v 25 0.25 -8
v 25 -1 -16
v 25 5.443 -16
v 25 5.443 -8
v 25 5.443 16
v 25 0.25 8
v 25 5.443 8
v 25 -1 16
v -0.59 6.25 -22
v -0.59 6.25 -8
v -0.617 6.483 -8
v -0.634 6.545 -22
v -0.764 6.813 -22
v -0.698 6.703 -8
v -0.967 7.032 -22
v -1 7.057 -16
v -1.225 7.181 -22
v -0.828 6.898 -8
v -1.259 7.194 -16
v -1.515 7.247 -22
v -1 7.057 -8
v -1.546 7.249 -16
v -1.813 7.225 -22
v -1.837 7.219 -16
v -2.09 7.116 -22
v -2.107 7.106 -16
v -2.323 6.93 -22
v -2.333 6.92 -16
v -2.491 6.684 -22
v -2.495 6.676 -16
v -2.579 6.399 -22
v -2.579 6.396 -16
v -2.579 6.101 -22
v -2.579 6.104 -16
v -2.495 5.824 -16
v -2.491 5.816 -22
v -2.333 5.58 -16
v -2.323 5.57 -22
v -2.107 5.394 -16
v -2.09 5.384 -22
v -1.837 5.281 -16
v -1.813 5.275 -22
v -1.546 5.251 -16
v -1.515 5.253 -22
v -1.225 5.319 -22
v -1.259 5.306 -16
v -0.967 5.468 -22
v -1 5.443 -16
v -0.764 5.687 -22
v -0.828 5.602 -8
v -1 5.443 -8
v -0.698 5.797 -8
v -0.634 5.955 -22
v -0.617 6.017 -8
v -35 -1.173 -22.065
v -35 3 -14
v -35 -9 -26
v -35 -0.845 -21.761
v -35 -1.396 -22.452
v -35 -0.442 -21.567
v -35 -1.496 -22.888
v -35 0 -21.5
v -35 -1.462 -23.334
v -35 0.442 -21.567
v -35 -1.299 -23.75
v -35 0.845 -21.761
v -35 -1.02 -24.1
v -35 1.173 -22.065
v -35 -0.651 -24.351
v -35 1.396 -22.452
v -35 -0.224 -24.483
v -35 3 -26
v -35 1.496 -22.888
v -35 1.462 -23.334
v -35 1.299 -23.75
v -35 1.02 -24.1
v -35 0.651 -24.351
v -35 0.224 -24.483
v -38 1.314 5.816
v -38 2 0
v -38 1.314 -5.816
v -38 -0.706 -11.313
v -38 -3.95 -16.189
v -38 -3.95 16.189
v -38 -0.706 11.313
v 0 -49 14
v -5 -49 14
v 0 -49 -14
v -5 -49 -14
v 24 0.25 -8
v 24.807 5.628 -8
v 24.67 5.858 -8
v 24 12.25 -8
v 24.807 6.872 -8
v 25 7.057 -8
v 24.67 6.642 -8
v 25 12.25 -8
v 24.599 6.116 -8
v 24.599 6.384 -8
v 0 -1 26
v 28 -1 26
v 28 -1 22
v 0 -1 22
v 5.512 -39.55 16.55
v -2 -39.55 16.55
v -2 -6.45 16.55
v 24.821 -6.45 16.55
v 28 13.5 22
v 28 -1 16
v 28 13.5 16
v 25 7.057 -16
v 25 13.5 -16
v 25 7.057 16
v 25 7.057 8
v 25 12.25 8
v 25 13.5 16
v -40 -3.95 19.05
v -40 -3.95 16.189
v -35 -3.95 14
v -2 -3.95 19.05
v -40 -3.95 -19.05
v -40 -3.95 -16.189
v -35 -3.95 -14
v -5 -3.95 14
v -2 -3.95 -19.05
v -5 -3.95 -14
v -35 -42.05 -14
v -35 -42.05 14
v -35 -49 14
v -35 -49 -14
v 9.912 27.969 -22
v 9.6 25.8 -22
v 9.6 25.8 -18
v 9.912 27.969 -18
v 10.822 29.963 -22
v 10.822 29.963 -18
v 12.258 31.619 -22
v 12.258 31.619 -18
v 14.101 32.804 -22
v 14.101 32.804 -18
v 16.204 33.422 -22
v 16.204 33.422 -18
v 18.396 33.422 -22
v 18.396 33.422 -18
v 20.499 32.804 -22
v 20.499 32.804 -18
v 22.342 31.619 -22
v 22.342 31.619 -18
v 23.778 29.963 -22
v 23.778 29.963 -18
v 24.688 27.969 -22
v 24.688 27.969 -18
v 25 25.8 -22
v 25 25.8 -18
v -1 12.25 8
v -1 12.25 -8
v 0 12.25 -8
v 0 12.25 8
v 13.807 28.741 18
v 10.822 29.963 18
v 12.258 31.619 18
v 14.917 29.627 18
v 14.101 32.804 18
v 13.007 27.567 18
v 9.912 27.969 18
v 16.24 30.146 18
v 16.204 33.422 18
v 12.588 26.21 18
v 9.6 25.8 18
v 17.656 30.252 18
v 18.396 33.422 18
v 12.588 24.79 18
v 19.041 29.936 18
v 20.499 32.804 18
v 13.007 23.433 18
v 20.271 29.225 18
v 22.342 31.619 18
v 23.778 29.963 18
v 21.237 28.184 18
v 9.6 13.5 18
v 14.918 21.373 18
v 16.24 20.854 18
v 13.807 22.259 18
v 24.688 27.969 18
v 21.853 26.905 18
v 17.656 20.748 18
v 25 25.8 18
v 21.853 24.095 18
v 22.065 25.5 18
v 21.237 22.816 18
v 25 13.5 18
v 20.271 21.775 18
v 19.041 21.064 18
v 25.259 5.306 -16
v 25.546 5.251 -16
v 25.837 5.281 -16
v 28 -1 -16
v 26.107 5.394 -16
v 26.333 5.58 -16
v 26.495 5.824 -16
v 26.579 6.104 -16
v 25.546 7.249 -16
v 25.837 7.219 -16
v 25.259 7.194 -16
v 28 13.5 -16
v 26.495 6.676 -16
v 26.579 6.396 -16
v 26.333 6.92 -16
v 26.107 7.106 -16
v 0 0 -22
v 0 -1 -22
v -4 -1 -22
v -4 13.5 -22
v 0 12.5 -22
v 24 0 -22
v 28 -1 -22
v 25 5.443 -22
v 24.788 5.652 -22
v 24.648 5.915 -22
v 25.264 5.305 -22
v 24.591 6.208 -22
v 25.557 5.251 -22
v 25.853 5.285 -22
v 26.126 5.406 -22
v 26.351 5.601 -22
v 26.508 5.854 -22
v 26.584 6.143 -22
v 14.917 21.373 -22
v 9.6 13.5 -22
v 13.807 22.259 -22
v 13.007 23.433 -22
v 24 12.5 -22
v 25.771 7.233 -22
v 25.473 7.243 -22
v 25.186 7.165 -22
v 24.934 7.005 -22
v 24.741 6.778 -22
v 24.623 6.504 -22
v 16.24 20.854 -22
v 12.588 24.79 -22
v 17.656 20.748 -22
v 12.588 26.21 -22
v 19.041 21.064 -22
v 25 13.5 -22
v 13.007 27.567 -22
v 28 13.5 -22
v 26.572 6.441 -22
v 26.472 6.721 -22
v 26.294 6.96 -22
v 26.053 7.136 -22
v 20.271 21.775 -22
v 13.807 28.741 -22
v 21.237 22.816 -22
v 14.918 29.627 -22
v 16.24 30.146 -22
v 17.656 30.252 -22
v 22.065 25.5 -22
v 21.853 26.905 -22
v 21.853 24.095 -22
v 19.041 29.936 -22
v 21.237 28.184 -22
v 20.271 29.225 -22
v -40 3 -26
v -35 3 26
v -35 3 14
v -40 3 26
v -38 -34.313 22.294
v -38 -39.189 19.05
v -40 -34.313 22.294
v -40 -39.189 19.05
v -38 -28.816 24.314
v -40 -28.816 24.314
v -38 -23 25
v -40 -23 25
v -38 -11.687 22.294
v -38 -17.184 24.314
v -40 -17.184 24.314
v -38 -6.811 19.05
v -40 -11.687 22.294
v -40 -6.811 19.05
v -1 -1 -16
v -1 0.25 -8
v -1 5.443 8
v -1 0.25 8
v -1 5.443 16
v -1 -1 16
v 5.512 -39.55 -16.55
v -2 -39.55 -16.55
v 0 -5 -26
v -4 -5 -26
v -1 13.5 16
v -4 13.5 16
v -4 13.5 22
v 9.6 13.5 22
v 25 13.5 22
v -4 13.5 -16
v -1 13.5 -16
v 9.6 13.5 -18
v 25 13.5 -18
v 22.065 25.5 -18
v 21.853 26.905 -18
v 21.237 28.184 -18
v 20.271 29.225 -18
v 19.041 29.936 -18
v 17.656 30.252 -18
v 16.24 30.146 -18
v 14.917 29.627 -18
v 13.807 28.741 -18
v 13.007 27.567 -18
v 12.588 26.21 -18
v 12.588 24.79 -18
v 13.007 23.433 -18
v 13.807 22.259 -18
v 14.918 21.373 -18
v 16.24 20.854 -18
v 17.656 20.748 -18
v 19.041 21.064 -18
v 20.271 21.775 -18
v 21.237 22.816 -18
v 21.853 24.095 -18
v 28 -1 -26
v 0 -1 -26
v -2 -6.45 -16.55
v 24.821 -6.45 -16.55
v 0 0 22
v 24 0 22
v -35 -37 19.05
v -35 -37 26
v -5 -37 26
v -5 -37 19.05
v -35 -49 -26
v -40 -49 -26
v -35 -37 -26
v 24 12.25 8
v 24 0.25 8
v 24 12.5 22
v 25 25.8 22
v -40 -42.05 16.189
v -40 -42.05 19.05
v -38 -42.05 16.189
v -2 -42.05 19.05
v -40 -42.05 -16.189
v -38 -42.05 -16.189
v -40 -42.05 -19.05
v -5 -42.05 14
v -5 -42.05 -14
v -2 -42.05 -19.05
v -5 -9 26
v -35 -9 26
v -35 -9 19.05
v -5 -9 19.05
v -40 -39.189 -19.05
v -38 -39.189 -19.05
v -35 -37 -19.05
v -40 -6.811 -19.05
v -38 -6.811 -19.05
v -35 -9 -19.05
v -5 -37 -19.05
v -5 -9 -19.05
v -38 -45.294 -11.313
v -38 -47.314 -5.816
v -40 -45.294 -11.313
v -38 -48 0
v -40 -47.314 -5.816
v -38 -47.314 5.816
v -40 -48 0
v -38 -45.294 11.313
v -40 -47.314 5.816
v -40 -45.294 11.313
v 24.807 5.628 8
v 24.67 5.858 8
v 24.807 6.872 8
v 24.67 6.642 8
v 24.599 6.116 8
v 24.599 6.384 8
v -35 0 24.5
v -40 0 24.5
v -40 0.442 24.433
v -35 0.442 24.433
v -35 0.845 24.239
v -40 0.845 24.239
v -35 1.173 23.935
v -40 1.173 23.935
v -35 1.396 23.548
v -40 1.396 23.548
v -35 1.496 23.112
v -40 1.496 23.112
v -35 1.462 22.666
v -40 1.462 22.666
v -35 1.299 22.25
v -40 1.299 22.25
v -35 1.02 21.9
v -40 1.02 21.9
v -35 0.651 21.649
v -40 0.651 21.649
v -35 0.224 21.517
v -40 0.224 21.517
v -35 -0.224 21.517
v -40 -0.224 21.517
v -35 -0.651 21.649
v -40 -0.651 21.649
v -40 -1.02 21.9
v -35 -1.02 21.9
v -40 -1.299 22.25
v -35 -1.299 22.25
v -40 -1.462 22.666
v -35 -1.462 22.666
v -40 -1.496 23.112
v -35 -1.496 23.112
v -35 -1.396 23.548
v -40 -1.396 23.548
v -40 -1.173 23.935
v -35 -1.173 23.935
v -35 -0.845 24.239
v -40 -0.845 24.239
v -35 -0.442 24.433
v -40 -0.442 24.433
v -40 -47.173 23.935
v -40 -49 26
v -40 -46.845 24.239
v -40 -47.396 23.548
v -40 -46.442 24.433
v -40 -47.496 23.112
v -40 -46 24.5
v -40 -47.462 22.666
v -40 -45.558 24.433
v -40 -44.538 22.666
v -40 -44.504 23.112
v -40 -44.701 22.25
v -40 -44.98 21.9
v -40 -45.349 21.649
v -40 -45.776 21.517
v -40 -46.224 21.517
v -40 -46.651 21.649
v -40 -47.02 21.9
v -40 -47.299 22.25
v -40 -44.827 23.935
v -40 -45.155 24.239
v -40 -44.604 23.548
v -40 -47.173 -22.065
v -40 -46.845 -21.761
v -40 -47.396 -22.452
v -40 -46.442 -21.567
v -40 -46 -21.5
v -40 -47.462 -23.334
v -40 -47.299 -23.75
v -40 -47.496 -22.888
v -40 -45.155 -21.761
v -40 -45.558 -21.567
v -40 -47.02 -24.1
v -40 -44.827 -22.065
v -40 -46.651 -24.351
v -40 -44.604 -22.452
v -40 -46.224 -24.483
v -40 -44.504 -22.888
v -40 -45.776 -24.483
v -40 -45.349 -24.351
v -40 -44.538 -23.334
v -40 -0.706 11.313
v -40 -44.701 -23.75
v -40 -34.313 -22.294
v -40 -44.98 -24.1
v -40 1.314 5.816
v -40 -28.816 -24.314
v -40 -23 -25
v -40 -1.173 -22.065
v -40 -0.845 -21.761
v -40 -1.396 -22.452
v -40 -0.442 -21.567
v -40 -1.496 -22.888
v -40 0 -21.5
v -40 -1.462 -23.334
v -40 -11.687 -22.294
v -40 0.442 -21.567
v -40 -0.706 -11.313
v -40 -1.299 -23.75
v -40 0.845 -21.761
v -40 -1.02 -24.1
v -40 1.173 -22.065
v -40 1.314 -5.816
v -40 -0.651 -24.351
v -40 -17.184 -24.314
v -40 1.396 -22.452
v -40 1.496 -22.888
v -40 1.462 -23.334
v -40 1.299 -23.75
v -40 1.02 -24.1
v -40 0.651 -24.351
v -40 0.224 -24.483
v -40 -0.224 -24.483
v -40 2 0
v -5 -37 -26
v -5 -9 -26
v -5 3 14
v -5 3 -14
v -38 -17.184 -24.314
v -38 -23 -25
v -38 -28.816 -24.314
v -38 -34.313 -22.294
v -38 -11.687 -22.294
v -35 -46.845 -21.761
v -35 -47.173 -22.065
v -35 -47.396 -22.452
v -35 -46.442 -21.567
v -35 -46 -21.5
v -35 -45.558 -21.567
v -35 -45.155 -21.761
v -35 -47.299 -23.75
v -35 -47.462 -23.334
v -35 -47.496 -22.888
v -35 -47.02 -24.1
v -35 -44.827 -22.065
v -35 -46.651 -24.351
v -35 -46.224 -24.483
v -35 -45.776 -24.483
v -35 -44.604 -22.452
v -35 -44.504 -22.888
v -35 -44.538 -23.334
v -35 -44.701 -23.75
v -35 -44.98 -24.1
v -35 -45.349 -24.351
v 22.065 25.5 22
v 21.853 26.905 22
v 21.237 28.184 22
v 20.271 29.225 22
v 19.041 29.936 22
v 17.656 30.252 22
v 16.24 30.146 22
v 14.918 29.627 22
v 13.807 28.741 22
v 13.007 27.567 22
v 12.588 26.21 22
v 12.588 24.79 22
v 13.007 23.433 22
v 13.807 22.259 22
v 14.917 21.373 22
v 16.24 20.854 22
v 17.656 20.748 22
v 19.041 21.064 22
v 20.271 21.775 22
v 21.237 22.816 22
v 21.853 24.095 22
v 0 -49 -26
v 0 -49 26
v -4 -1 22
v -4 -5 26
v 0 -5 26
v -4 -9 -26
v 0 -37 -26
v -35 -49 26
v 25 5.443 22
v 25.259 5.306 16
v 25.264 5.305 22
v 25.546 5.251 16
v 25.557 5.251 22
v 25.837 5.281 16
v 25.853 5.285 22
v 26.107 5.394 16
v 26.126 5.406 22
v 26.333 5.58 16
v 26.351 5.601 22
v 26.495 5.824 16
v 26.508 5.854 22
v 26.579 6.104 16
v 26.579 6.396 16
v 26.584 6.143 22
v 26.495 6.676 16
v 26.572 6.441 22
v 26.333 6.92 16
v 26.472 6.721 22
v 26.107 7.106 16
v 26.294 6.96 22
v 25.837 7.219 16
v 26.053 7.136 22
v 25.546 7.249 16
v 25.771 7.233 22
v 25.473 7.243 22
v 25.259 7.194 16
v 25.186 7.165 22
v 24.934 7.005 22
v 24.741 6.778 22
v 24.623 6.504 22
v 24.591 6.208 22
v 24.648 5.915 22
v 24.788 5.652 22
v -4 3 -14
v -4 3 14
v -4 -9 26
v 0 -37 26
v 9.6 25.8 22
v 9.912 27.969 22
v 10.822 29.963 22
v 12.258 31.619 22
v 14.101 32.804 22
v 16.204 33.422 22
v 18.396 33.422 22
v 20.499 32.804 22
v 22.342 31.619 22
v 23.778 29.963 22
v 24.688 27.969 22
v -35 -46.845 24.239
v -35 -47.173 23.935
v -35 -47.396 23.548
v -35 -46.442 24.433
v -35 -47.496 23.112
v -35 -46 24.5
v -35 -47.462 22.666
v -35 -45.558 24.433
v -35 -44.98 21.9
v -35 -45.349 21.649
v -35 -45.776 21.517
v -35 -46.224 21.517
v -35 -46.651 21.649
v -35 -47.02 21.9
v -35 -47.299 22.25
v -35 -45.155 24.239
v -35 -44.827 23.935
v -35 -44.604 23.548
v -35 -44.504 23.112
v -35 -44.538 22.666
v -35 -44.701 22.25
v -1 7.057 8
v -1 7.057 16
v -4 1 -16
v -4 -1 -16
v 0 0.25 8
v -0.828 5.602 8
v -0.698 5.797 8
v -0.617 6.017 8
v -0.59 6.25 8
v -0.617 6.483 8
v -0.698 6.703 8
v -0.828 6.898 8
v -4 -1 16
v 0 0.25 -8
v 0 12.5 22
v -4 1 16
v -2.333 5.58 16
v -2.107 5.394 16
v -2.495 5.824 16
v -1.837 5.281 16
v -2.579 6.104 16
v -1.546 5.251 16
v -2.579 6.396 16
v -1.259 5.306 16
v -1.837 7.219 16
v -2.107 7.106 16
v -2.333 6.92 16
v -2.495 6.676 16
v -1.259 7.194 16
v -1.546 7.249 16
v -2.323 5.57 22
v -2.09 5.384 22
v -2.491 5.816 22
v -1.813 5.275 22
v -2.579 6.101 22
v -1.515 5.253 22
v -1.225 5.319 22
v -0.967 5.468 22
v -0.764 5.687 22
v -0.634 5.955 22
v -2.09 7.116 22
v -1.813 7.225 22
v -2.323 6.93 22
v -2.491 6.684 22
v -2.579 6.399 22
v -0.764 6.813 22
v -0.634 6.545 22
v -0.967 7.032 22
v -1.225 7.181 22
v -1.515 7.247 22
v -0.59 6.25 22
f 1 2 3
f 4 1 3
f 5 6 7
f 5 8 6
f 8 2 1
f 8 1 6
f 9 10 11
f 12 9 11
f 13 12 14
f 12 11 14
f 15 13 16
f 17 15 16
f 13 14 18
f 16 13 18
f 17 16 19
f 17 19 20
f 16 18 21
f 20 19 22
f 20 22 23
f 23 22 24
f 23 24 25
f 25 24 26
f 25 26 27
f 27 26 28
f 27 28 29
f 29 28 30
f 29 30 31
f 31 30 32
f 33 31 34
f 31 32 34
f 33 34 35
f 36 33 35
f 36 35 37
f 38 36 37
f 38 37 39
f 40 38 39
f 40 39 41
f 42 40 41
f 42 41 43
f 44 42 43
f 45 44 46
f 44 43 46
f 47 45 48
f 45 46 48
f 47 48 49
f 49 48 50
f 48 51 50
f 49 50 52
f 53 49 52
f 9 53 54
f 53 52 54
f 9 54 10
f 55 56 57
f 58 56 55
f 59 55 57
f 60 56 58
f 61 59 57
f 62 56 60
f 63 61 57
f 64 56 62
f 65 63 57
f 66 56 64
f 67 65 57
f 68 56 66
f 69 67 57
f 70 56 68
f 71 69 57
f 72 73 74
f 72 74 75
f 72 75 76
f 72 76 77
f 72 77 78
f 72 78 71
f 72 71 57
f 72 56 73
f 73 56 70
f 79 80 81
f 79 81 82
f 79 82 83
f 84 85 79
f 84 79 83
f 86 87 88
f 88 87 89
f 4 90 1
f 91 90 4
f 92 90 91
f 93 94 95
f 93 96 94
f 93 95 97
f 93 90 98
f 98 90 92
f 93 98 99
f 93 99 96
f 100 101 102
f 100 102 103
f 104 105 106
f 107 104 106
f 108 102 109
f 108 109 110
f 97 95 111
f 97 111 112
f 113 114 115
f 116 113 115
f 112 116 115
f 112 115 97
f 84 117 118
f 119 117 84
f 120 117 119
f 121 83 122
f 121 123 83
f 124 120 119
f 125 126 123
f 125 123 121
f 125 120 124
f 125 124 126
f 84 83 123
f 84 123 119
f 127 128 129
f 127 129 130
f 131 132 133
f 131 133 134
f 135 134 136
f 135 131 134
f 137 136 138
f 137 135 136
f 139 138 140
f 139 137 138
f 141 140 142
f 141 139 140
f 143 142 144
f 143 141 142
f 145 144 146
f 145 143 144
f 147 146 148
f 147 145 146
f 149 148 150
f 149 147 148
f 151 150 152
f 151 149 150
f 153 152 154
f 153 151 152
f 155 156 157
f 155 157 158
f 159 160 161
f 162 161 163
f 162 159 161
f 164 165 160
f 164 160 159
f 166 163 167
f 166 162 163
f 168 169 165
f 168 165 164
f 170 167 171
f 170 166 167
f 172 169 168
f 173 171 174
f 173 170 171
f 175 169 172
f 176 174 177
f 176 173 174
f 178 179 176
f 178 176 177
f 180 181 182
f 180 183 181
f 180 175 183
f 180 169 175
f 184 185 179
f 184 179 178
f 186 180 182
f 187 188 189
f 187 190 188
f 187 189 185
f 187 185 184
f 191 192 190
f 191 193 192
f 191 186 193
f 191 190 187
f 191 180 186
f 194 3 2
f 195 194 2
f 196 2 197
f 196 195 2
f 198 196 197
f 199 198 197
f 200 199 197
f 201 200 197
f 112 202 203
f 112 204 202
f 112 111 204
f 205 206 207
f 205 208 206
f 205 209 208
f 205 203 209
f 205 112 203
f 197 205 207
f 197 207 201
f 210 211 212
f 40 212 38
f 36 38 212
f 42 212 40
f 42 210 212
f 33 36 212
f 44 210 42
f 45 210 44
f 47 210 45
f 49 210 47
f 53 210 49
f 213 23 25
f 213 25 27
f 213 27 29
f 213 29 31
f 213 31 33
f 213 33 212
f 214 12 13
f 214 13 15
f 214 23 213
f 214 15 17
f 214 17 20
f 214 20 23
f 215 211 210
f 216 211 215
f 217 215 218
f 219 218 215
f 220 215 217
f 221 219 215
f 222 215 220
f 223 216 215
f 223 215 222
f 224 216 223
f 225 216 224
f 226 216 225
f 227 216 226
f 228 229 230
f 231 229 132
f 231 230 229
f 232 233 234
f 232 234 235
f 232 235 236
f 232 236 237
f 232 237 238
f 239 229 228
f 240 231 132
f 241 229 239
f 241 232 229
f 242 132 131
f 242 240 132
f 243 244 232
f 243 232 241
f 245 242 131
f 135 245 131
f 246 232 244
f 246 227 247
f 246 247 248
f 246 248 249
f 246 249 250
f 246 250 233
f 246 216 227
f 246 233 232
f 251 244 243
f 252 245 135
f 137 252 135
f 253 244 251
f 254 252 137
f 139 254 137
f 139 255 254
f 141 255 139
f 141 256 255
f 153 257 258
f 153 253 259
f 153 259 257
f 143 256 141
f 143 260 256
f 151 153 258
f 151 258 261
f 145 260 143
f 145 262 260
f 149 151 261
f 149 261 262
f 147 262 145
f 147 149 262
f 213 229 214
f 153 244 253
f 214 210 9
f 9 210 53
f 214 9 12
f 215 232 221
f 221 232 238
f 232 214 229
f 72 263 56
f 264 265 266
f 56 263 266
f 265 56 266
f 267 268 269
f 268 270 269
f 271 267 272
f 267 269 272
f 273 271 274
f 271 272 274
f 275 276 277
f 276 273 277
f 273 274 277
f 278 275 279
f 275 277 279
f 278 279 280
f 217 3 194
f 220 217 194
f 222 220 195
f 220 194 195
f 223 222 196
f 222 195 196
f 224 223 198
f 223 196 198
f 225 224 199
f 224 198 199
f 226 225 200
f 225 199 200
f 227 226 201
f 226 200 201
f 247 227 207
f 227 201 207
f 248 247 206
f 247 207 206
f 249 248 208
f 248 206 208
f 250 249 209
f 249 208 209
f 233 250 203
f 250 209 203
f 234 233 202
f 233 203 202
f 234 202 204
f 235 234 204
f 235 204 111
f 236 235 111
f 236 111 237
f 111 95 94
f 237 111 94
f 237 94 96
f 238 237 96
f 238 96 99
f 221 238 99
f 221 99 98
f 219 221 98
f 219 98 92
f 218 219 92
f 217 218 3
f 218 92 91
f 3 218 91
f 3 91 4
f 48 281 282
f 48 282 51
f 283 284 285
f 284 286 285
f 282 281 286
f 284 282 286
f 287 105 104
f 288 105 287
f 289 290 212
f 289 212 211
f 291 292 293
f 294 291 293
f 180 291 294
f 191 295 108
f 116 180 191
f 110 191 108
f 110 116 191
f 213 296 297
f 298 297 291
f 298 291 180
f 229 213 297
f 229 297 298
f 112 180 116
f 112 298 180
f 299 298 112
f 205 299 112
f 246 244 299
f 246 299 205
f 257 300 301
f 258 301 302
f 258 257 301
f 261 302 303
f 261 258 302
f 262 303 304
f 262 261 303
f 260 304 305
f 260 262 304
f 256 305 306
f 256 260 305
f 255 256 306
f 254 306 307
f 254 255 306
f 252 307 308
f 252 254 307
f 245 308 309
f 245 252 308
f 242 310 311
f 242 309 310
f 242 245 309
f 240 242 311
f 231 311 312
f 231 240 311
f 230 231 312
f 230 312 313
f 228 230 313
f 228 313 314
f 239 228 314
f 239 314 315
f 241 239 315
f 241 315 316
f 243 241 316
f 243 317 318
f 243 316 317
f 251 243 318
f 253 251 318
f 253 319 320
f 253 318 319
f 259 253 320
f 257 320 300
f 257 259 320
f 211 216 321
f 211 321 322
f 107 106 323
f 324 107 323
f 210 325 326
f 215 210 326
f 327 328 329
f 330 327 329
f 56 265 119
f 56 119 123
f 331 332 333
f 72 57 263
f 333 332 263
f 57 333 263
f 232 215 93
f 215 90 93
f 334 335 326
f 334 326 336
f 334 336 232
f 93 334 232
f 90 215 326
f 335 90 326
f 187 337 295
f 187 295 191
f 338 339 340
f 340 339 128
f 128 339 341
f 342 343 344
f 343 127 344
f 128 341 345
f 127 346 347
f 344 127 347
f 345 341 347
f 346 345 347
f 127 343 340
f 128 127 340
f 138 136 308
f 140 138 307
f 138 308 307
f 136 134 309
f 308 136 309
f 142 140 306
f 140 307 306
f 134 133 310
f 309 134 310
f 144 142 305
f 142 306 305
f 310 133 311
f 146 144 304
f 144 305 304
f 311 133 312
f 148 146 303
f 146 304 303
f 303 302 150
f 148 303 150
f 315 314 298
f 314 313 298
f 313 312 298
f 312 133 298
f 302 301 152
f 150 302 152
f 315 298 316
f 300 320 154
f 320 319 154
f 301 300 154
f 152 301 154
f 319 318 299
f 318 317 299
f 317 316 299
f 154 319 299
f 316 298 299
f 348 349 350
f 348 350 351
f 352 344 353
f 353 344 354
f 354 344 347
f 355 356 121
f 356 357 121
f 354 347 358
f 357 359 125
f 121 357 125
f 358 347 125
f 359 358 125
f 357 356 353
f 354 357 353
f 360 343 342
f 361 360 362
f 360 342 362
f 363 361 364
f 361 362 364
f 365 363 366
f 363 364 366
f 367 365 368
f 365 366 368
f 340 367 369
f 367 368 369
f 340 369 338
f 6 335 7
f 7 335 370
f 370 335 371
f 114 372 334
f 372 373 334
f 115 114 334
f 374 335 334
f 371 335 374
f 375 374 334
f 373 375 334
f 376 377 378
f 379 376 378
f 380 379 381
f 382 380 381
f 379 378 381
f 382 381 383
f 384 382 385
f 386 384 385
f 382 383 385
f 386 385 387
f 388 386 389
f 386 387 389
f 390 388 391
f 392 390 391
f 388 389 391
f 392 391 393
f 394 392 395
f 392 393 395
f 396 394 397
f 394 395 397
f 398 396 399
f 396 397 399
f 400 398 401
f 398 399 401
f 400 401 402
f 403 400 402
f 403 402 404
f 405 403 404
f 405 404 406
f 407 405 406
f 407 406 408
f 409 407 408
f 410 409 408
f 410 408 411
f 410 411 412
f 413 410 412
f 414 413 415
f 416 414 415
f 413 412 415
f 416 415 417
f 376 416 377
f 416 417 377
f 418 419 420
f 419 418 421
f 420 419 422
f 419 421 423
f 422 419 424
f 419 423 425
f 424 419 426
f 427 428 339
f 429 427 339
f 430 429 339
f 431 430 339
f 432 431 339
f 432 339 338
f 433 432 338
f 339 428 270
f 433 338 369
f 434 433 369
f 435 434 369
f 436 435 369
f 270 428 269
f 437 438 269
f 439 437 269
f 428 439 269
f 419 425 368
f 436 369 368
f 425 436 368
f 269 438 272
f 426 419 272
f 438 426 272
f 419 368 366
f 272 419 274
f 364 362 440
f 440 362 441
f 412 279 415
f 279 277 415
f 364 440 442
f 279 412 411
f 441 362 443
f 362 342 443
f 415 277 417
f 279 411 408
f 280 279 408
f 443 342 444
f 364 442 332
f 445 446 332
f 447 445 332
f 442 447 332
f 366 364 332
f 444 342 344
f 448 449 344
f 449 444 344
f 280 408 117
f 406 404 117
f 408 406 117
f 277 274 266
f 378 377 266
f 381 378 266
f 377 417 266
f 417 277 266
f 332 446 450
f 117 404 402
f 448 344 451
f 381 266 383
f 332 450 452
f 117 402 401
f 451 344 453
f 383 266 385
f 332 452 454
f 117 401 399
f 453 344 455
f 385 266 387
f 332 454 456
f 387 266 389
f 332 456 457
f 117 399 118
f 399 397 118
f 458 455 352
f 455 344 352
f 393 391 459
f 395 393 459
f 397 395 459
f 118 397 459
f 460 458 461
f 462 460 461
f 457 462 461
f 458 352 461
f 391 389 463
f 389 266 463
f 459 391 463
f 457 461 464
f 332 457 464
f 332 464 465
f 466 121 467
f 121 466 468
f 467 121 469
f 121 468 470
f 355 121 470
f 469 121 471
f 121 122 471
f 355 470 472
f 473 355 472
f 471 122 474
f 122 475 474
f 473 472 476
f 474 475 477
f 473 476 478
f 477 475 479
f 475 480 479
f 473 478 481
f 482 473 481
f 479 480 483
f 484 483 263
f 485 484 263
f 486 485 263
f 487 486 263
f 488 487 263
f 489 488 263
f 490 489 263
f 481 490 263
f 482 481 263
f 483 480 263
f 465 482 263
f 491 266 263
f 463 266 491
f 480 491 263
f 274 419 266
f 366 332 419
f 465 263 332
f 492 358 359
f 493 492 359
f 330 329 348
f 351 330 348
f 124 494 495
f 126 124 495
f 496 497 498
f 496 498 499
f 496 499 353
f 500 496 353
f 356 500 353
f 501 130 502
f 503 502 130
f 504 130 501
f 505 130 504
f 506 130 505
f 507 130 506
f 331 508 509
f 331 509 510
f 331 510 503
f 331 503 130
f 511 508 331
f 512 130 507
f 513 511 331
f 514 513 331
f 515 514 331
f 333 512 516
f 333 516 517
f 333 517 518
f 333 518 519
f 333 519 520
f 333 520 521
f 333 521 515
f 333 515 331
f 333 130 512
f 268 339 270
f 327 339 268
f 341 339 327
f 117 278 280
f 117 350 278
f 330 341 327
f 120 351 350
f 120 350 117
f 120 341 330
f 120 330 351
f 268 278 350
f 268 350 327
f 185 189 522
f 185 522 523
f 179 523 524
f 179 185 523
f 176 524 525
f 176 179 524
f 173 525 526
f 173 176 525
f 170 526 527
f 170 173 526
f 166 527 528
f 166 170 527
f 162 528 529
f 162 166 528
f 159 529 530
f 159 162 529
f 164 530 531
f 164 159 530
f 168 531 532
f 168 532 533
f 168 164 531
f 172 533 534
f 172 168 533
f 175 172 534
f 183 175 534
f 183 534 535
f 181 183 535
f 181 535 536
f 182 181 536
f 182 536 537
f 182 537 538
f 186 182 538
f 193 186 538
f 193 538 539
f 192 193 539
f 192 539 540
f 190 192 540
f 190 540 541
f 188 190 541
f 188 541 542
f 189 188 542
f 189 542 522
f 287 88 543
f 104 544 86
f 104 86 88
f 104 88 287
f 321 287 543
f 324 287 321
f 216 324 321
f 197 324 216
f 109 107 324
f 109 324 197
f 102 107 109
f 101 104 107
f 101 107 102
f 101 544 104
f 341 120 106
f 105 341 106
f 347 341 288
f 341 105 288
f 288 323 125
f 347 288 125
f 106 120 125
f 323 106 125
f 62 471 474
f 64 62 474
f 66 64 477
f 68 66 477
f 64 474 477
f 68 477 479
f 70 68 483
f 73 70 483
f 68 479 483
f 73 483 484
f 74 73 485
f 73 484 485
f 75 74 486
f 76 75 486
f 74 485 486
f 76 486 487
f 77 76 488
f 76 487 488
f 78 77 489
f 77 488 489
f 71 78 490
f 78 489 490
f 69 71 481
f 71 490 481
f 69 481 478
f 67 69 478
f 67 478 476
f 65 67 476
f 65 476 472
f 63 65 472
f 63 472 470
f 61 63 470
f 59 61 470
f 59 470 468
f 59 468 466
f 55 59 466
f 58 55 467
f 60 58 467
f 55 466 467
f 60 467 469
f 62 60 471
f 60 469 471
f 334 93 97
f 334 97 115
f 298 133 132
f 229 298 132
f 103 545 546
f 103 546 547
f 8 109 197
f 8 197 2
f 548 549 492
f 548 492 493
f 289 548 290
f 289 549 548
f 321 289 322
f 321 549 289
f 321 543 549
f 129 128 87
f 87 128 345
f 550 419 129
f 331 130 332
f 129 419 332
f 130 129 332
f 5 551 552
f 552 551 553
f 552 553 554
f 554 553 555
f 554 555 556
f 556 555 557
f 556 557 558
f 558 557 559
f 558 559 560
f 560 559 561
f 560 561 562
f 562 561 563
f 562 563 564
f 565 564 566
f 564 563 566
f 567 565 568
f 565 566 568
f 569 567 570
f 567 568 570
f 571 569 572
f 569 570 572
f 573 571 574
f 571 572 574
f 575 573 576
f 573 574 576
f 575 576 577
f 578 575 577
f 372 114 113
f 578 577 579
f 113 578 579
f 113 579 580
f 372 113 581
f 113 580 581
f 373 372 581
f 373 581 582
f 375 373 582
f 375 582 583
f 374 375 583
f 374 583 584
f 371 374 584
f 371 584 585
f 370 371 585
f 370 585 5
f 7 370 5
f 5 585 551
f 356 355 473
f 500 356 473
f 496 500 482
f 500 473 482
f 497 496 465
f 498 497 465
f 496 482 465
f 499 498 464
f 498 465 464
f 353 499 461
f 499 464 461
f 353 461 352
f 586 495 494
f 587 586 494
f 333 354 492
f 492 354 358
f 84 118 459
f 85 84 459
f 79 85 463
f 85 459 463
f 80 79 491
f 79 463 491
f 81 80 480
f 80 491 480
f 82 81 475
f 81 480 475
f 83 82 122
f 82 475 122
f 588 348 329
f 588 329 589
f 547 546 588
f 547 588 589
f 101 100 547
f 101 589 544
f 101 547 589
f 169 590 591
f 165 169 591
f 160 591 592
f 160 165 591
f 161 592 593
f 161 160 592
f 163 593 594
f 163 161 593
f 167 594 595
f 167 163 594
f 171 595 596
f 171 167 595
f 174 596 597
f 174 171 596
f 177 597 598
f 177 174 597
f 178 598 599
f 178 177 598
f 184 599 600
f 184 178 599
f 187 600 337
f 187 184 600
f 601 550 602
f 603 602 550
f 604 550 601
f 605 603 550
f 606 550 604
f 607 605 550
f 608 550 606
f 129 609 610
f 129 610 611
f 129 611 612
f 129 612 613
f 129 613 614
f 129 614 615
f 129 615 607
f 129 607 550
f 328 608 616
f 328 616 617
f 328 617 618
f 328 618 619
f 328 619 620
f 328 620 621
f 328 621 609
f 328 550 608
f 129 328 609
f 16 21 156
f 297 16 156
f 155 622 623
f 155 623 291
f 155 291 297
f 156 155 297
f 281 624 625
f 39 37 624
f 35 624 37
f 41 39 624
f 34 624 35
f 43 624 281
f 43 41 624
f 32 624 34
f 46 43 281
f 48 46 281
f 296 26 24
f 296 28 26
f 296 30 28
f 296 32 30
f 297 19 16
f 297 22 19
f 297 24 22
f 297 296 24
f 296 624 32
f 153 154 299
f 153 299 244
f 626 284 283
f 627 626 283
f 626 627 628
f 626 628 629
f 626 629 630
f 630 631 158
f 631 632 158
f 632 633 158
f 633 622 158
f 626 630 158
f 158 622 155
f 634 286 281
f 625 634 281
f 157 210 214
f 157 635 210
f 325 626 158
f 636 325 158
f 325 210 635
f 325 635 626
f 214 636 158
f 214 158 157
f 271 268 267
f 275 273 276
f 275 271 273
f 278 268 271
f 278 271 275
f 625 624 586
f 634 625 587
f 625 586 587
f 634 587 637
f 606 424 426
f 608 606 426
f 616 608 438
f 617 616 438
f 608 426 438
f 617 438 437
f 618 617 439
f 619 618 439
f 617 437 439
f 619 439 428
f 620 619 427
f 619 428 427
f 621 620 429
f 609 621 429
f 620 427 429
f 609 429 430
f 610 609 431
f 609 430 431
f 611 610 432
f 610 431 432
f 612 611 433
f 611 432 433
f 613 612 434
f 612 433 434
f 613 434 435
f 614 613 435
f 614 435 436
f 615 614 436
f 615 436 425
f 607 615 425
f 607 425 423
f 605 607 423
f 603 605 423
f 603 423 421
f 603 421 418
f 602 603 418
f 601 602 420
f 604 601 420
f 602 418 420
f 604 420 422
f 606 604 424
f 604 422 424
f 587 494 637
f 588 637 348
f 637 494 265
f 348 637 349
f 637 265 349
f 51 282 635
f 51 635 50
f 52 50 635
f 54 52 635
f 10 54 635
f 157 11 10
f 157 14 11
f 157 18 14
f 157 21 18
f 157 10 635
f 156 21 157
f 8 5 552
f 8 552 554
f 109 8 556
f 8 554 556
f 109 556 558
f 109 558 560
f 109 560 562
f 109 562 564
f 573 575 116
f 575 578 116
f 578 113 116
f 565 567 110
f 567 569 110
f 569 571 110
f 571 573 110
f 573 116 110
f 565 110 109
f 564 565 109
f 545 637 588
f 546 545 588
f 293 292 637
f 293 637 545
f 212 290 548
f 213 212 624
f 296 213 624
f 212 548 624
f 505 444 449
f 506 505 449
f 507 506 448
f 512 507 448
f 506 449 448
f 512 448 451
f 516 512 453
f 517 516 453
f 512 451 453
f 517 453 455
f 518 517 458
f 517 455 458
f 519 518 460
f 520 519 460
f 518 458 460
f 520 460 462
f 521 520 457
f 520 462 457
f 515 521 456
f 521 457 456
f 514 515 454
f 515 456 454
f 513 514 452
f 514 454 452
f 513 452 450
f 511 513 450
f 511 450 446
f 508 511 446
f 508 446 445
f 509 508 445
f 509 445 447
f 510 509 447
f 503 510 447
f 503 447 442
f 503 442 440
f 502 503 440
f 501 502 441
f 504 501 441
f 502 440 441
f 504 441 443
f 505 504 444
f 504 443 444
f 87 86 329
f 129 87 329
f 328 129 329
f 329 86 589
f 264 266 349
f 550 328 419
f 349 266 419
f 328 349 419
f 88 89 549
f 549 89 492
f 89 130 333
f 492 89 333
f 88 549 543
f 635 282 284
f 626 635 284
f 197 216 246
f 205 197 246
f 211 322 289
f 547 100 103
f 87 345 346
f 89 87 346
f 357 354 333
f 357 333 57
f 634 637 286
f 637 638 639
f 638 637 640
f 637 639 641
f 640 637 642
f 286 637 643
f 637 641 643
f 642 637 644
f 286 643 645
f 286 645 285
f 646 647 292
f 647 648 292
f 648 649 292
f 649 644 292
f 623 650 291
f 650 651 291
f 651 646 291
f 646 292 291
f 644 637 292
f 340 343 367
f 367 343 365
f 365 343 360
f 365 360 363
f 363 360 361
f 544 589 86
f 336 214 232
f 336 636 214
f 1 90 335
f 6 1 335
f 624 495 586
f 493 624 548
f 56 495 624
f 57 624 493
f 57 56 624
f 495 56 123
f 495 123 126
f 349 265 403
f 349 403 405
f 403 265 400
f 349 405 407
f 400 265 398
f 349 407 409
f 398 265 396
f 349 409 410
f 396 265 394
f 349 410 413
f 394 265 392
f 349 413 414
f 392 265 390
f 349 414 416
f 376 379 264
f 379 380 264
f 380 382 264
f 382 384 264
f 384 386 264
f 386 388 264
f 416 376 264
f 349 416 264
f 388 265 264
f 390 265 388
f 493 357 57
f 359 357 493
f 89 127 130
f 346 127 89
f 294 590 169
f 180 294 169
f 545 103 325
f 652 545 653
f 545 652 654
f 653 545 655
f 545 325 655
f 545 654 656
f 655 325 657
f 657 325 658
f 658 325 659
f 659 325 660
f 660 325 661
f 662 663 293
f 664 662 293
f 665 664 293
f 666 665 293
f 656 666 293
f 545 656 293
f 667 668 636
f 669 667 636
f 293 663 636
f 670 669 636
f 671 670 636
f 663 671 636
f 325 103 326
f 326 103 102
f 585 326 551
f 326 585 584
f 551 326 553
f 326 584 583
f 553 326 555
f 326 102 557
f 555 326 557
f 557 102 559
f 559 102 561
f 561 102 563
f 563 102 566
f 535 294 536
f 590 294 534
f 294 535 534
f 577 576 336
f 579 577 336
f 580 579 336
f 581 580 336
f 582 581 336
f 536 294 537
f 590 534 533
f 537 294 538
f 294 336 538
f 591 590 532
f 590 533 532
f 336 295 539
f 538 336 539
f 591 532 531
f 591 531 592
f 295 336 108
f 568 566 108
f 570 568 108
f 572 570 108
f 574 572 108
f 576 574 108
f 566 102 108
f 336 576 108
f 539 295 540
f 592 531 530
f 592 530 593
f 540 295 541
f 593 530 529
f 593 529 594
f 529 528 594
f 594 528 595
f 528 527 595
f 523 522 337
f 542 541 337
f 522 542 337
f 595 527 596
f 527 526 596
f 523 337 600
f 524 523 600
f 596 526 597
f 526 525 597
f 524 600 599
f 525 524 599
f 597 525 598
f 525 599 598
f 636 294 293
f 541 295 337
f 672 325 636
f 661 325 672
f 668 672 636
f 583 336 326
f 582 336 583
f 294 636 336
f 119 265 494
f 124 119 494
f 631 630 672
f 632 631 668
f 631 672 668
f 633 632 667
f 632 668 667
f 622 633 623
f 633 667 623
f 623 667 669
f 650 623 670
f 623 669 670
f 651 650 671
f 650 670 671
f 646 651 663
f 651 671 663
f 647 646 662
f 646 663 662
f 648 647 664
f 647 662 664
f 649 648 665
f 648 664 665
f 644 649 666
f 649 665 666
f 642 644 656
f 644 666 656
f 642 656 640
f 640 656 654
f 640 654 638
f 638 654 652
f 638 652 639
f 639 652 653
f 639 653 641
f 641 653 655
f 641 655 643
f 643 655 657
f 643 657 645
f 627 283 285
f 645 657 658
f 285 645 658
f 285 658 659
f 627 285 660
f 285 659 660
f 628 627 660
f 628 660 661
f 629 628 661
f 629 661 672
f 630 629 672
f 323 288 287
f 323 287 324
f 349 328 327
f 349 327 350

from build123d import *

# Parameters (mm, degrees)
SKETCH1_W            = 26
SKETCH1_H            = 14.5
SKETCH1_W_2          = 24
SKETCH1_H_2          = 12.5
BOSS_EXTRUDE1_DEPTH  = 22
SKETCH2_W            = 3
SKETCH2_H            = 14.5
BOSS_EXTRUDE2_DEPTH  = 6
CUT_EXTRUDE1_REACH   = 40.823
SKETCH3_W            = 16
SKETCH3_H            = 12
CUT_EXTRUDE2_REACH   = 55.873
SKETCH4_R            = 1
SKETCH5_W            = 44
SKETCH5_H            = 44
SKETCH5_W_2          = 38.1
SKETCH5_H_2          = 38.1
BOSS_EXTRUDE3_DEPTH  = 40
SKETCH8_W            = 52
SKETCH8_H            = 52
SKETCH8_W_2          = 44
SKETCH8_H_2          = 44
BOSS_EXTRUDE5_DEPTH  = 36
SKETCH6_R            = 25
CUT_EXTRUDE5_DEPTH   = 2
BOSS_EXTRUDE6_DEPTH  = 4
CHAMFER1_SIZE        = 12
CUT_EXTRUDE7_REACH   = 83.884
SKETCH11_W           = 30
SKETCH11_H           = 28
CUT_EXTRUDE8_REACH   = 72.569
SKETCH12_W           = 30
SKETCH12_H           = 28
CHAMFER3_SIZE        = 4
SKETCH14_R           = 1.5
BOSS_EXTRUDE7_DEPTH  = 5
SKETCH15_W           = 38.1
SKETCH15_H           = 38.1
SKETCH15_W_2         = 33.1
SKETCH15_H_2         = 33.1
BOSS_EXTRUDE8_DEPTH  = 2
SKETCH16_W           = 15.4
SKETCH16_H           = 4
BOSS_EXTRUDE9_DEPTH  = 20
CUT_EXTRUDE10_START  = -44
SKETCH18_R           = 4.765
CUT_EXTRUDE10_DEPTH  = 44
FILLET4_RADIUS       = 7.7
FILLET4_LENGTH       = 4
FILLET5_RADIUS       = 7.7
FILLET5_LENGTH       = 4
BOSS_EXTRUDE10_REACH = 83.884
CUT_EXTRUDE12_REACH  = 70.389
SKETCH15_3_W         = 33.1
SKETCH15_3_H         = 33.1


# Some blends are built 0.0001 mm under size
with BuildPart() as part:
    # Sketch1 → Boss-Extrude1 (new body)
    with BuildSketch(Plane.XY):
        with Locations((12, 6.25)):
            Rectangle(SKETCH1_W, SKETCH1_H)
        with Locations((12, 6.25)):
            Rectangle(SKETCH1_W_2, SKETCH1_H_2, mode=Mode.SUBTRACT)
    boss_extrude1 = extrude(amount=BOSS_EXTRUDE1_DEPTH)

    # Sketch2 → Boss-Extrude2 (add)
    with BuildSketch(Plane.XY.offset(22)):
        with Locations((-2.5, 6.25)):
            Rectangle(SKETCH2_W, SKETCH2_H)
        with Locations((26.5, 6.25)):
            Rectangle(SKETCH2_W, SKETCH2_H)
    boss_extrude2 = extrude(amount=-BOSS_EXTRUDE2_DEPTH)

    # Mirror2: Boss-Extrude1, Boss-Extrude2 across plane
    add(boss_extrude1.mirror(Plane(origin=(0, 0, 0), x_dir=(1, 0, 0), z_dir=(0, 0, -1))))
    add(boss_extrude2.mirror(Plane(origin=(0, 0, 0), x_dir=(1, 0, 0), z_dir=(0, 0, -1))))

    # Cut-Extrude1: up to this face of the body (flat: up to its plane)
    cut_extrude1_end = Plane(part.part.faces().sort_by_distance((25, 6.25, 0))[0])
    # Sketch3 → Cut-Extrude1 (cut, up to the picked face)
    with BuildSketch(Plane.ZY.offset(1), mode=Mode.PRIVATE) as cut_extrude1_sk1:
        with Locations((0, 6.25)):
            Rectangle(SKETCH3_W, SKETCH3_H)
    cut_extrude1_tool1 = split(extrude(cut_extrude1_sk1.sketch, amount=-CUT_EXTRUDE1_REACH, mode=Mode.PRIVATE), bisect_by=cut_extrude1_end, keep=Keep.BOTH, mode=Mode.PRIVATE)
    add(cut_extrude1_tool1.solids().sort_by(Axis((-1, 6.25, 0), (1, 0, 0)))[0], mode=Mode.SUBTRACT)

    # Sketch4 → Cut-Extrude2 (cut, up to next)
    with BuildSketch(Plane.XY.offset(22), mode=Mode.PRIVATE) as cut_extrude2_sk1:
        with Locations((-1.59, 6.25)):
            Circle(SKETCH4_R)
    cut_extrude2_tool1 = extrude(cut_extrude2_sk1.sketch, amount=-CUT_EXTRUDE2_REACH, mode=Mode.PRIVATE) & part.part
    # Sketch4 → Cut-Extrude2 (cut, up to next)
    with BuildSketch(Plane.XY.offset(22), mode=Mode.PRIVATE) as cut_extrude2_sk2:
        with Locations(Location((25.59, 6.25, 0), (0, 0, 233.842991799))):
            Circle(SKETCH4_R)
    cut_extrude2_tool2 = extrude(cut_extrude2_sk2.sketch, amount=-CUT_EXTRUDE2_REACH, mode=Mode.PRIVATE) & part.part
    add(cut_extrude2_tool1.solids().sort_by_distance((-1.59, 6.25, 22))[0], mode=Mode.SUBTRACT)
    add(cut_extrude2_tool1.solids().sort_by_distance((-1.59, 6.25, 22))[1], mode=Mode.SUBTRACT)
    add(cut_extrude2_tool2.solids().sort_by_distance((25.59, 6.25, 22))[0], mode=Mode.SUBTRACT)
    add(cut_extrude2_tool2.solids().sort_by_distance((25.59, 6.25, 22))[1], mode=Mode.SUBTRACT)

    # Sketch5 → Boss-Extrude3 (add)
    with BuildSketch(Plane(origin=(0, 0, 0), x_dir=(0, 0, -1), z_dir=(1, 0, 0))):
        with Locations((0, -23)):
            Rectangle(SKETCH5_W, SKETCH5_H)
        with Locations((0, -23)):
            Rectangle(SKETCH5_W_2, SKETCH5_H_2, mode=Mode.SUBTRACT)
    extrude(amount=-BOSS_EXTRUDE3_DEPTH)

    # Sketch8 → Boss-Extrude5 (add)
    with BuildSketch(Plane.ZY.offset(40)):
        with Locations((0, -23)):
            Rectangle(SKETCH8_W, SKETCH8_H)
        with Locations((0, -23)):
            Rectangle(SKETCH8_W_2, SKETCH8_H_2, mode=Mode.SUBTRACT)
    extrude(amount=-BOSS_EXTRUDE5_DEPTH)

    # Sketch6 → Cut-Extrude5 (cut)
    with BuildSketch(Plane.ZY.offset(40)):
        with Locations((0, -23)):
            Circle(SKETCH6_R)
    extrude(amount=-CUT_EXTRUDE5_DEPTH, mode=Mode.SUBTRACT)

    # Sketch9 → Boss-Extrude6 (add)
    with BuildSketch(Plane(origin=(-4, 0, 0), x_dir=(0, 0, -1), z_dir=(1, 0, 0))):
        Polygon((-26, -49), (26, -49), (26, -1), (22, -1), (22, -45), (-22, -45), (-22, -1), (-26, -1), align=None)
    extrude(amount=BOSS_EXTRUDE6_DEPTH)

    # Chamfer1
    # the kernel refuses this chamfer: 12 mm, written as the material it takes off along each edge
    with BuildSketch(Plane(origin=(-70.860195856, 3, 26), x_dir=(0, 0.027495876610586382, -0.9996219169112968), z_dir=(1, 0, 0))) as chamfer1_piece_1:
        Polygon((CHAMFER1_SIZE * 0.999621916911, -CHAMFER1_SIZE * 0.0274958766106), (-CHAMFER1_SIZE * 0.0274958766106, -CHAMFER1_SIZE * 0.999621916911), (0, 0), align=None)
    extrude(amount=66.860195856, mode=Mode.SUBTRACT)
    with BuildSketch(Plane(origin=(30.860195856, -49, 26), x_dir=(0, -0.027495876610586202, -0.9996219169112968), z_dir=(-1, 0, 0)), Plane(origin=(-70.860195856, -49, -26), x_dir=(0, -0.027495876610586202, 0.9996219169112968), z_dir=(1, 0, 0))) as chamfer1_piece_2:
        Polygon((CHAMFER1_SIZE * 0.999621916911, -CHAMFER1_SIZE * 0.0274958766106), (-CHAMFER1_SIZE * 0.0274958766106, -CHAMFER1_SIZE * 0.999621916911), (0, 0), align=None)
    extrude(amount=101.720391711, mode=Mode.SUBTRACT)
    with BuildSketch(Plane(origin=(-70.860195856, 3, -26), x_dir=(0, 0.027495876610586382, 0.9996219169112968), z_dir=(1, 0, 0))) as chamfer1_piece_3:
        Polygon((CHAMFER1_SIZE * 0.999621916911, CHAMFER1_SIZE * 0.0274958766106), (-CHAMFER1_SIZE * 0.0274958766106, CHAMFER1_SIZE * 0.999621916911), (0, 0), align=None)
    extrude(amount=66.860195856, mode=Mode.SUBTRACT)

    # Cut-Extrude7: up to this face of the body (flat: up to its plane)
    cut_extrude7_end = Plane(part.part.faces().sort_by_distance((-19.5, -22.5, -26))[0])
    # Sketch11 → Cut-Extrude7 (cut, up to the picked face)
    with BuildSketch(Plane.XY.offset(26), mode=Mode.PRIVATE) as cut_extrude7_sk1:
        with Locations((-20, -23)):
            Rectangle(SKETCH11_W, SKETCH11_H)
    cut_extrude7_tool1 = split(extrude(cut_extrude7_sk1.sketch, amount=-CUT_EXTRUDE7_REACH, mode=Mode.PRIVATE), bisect_by=cut_extrude7_end, keep=Keep.BOTH, mode=Mode.PRIVATE)
    add(cut_extrude7_tool1.solids().sort_by(Axis((-20, -23, 26), (0, 0, -1)))[0], mode=Mode.SUBTRACT)

    # Cut-Extrude8: up to this face of the body (flat: up to its plane)
    cut_extrude8_end = Plane(part.part.faces().sort_by_distance((-20, -49, 0))[0])
    # Sketch12 → Cut-Extrude8 (cut, up to the picked face)
    with BuildSketch(Plane(origin=(0, 3, 0), x_dir=(1, 0, 0), z_dir=(0, 1, 0)), mode=Mode.PRIVATE) as cut_extrude8_sk1:
        with Locations((-20, 0)):
            Rectangle(SKETCH12_W, SKETCH12_H)
    cut_extrude8_tool1 = split(extrude(cut_extrude8_sk1.sketch, amount=-CUT_EXTRUDE8_REACH, mode=Mode.PRIVATE), bisect_by=cut_extrude8_end, keep=Keep.BOTH, mode=Mode.PRIVATE)
    add(cut_extrude8_tool1.solids().sort_by(Axis((-20, 3, 0), (0, -1, 0)))[0], mode=Mode.SUBTRACT)

    # Chamfer3
    chamfer3_edges = [part.edges().sort_by_distance(p)[0] for p in [
        (-2, -1, -26),
        (-2, -1, 26),
    ]]
    chamfer(chamfer3_edges, length=CHAMFER3_SIZE - 0.0001)  # a hair under: the kernel refuses the full size

    # Sketch14 → Boss-Extrude7 (add)
    # profile 1 of 4: a face of its own
    with BuildSketch(Plane.ZY.offset(40)):
        Polygon((-26, 3), (-14, 3), (-26, -9), align=None)
        with Locations((-23, 0)):
            Circle(SKETCH14_R, mode=Mode.SUBTRACT)
    # profile 2 of 4: a face of its own
    with BuildSketch(Plane.ZY.offset(40)):
        Polygon((14, 3), (26, -9), (26, 3), align=None)
        with Locations((23, 0)):
            Circle(SKETCH14_R, mode=Mode.SUBTRACT)
    # profile 3 of 4: a face of its own
    with BuildSketch(Plane.ZY.offset(40)):
        Polygon((26, -49), (14, -49), (26, -37), align=None)
        with Locations((23, -46)):
            Circle(SKETCH14_R, mode=Mode.SUBTRACT)
    # profile 4 of 4: a face of its own
    with BuildSketch(Plane.ZY.offset(40)):
        Polygon((-26, -49), (-26, -37), (-14, -49), align=None)
        with Locations((-23, -46)):
            Circle(SKETCH14_R, mode=Mode.SUBTRACT)
    extrude(amount=-BOSS_EXTRUDE7_DEPTH)

    # Sketch15 → Boss-Extrude8 (add)
    with BuildSketch(Plane(origin=(0, 0, 0), x_dir=(0, 0, -1), z_dir=(1, 0, 0))):
        with Locations((0, -23)):
            Rectangle(SKETCH15_W, SKETCH15_H)
        with Locations((0, -23)):
            Rectangle(SKETCH15_W_2, SKETCH15_H_2, mode=Mode.SUBTRACT)
    extrude(amount=-BOSS_EXTRUDE8_DEPTH)

    # Sketch16 → Boss-Extrude9 (add)
    with BuildSketch(Plane(origin=(0, 13.5, 0), x_dir=(1, 0, 0), z_dir=(0, 1, 0))):
        with Locations((17.3, -20)):
            Rectangle(SKETCH16_W, SKETCH16_H)
        with Locations((17.3, 20)):
            Rectangle(SKETCH16_W, SKETCH16_H)
    extrude(amount=BOSS_EXTRUDE9_DEPTH)

    # Sketch18 → Cut-Extrude10 (cut)
    with BuildSketch(Plane.XY.offset(22).offset(CUT_EXTRUDE10_START)):
        with Locations((17.3, 25.5)):
            Circle(SKETCH18_R)
    extrude(amount=CUT_EXTRUDE10_DEPTH, mode=Mode.SUBTRACT)

    # Fillet4: full round fillet: the end face becomes a half cylinder, R = half its width
    fillet4_face = Plane((17.3, 33.5, 20), x_dir=(0, 0, -1), z_dir=(0, 1, 0))  # on the end face: x along it, z out of the body
    fillet4_slab = fillet4_face.offset(-FILLET4_RADIUS / 2) * Box(FILLET4_LENGTH, 2 * FILLET4_RADIUS, FILLET4_RADIUS, mode=Mode.PRIVATE)  # the body's end, R deep
    fillet4_round = Plane((17.3, 25.8, 20), x_dir=(0, 1, 0), z_dir=(0, 0, -1)) * Cylinder(FILLET4_RADIUS, FILLET4_LENGTH, mode=Mode.PRIVATE)  # its axis R under the face
    add(fillet4_slab - fillet4_round, mode=Mode.SUBTRACT)

    # Fillet5: full round fillet: the end face becomes a half cylinder, R = half its width
    fillet5_face = Plane((17.3, 33.5, -20), x_dir=(0, 0, -1), z_dir=(0, 1, 0))  # on the end face: x along it, z out of the body
    fillet5_slab = fillet5_face.offset(-FILLET5_RADIUS / 2) * Box(FILLET5_LENGTH, 2 * FILLET5_RADIUS, FILLET5_RADIUS, mode=Mode.PRIVATE)  # the body's end, R deep
    fillet5_round = Plane((17.3, 25.8, -20), x_dir=(0, 1, 0), z_dir=(0, 0, -1)) * Cylinder(FILLET5_RADIUS, FILLET5_LENGTH, mode=Mode.PRIVATE)  # its axis R under the face
    add(fillet5_slab - fillet5_round, mode=Mode.SUBTRACT)

    # Boss-Extrude10: up to this face of the body (flat: up to its plane)
    boss_extrude10_end = Plane(part.part.faces().sort_by_distance((-2.448716798, -21.358932413, -26))[0])
    # Sketch19 → Boss-Extrude10 (add, up to the picked face)
    with BuildSketch(Plane.XY.offset(26), mode=Mode.PRIVATE) as boss_extrude10_sk1:
        Polygon((0, -49), (28, -1), (0, -1), align=None)
    boss_extrude10_tool1 = split(extrude(boss_extrude10_sk1.sketch, amount=-BOSS_EXTRUDE10_REACH, mode=Mode.PRIVATE), bisect_by=boss_extrude10_end, keep=Keep.BOTH, mode=Mode.PRIVATE)
    add(boss_extrude10_tool1.solids().sort_by(Axis((9.333333, -17, 26), (0, 0, -1)))[0])

    # Cut-Extrude12: up to this face of the body (flat: up to its plane)
    cut_extrude12_end = Plane(part.part.faces().sort_by_distance((14, -25, 0))[0])
    # Sketch15<3> → Cut-Extrude12 (cut, up to the picked face)
    with BuildSketch(Plane(origin=(0, 0, 0), x_dir=(0, 0, -1), z_dir=(1, 0, 0)), mode=Mode.PRIVATE) as cut_extrude12_sk1:
        with Locations((0, -23)):
            Rectangle(SKETCH15_3_W, SKETCH15_3_H)
    cut_extrude12_tool1 = split(extrude(cut_extrude12_sk1.sketch, amount=CUT_EXTRUDE12_REACH, mode=Mode.PRIVATE), bisect_by=cut_extrude12_end, keep=Keep.BOTH, mode=Mode.PRIVATE)
    add(cut_extrude12_tool1.solids().sort_by(Axis((0, -23, 0), (1, 0, 0)))[0], mode=Mode.SUBTRACT)


solid = part.part
